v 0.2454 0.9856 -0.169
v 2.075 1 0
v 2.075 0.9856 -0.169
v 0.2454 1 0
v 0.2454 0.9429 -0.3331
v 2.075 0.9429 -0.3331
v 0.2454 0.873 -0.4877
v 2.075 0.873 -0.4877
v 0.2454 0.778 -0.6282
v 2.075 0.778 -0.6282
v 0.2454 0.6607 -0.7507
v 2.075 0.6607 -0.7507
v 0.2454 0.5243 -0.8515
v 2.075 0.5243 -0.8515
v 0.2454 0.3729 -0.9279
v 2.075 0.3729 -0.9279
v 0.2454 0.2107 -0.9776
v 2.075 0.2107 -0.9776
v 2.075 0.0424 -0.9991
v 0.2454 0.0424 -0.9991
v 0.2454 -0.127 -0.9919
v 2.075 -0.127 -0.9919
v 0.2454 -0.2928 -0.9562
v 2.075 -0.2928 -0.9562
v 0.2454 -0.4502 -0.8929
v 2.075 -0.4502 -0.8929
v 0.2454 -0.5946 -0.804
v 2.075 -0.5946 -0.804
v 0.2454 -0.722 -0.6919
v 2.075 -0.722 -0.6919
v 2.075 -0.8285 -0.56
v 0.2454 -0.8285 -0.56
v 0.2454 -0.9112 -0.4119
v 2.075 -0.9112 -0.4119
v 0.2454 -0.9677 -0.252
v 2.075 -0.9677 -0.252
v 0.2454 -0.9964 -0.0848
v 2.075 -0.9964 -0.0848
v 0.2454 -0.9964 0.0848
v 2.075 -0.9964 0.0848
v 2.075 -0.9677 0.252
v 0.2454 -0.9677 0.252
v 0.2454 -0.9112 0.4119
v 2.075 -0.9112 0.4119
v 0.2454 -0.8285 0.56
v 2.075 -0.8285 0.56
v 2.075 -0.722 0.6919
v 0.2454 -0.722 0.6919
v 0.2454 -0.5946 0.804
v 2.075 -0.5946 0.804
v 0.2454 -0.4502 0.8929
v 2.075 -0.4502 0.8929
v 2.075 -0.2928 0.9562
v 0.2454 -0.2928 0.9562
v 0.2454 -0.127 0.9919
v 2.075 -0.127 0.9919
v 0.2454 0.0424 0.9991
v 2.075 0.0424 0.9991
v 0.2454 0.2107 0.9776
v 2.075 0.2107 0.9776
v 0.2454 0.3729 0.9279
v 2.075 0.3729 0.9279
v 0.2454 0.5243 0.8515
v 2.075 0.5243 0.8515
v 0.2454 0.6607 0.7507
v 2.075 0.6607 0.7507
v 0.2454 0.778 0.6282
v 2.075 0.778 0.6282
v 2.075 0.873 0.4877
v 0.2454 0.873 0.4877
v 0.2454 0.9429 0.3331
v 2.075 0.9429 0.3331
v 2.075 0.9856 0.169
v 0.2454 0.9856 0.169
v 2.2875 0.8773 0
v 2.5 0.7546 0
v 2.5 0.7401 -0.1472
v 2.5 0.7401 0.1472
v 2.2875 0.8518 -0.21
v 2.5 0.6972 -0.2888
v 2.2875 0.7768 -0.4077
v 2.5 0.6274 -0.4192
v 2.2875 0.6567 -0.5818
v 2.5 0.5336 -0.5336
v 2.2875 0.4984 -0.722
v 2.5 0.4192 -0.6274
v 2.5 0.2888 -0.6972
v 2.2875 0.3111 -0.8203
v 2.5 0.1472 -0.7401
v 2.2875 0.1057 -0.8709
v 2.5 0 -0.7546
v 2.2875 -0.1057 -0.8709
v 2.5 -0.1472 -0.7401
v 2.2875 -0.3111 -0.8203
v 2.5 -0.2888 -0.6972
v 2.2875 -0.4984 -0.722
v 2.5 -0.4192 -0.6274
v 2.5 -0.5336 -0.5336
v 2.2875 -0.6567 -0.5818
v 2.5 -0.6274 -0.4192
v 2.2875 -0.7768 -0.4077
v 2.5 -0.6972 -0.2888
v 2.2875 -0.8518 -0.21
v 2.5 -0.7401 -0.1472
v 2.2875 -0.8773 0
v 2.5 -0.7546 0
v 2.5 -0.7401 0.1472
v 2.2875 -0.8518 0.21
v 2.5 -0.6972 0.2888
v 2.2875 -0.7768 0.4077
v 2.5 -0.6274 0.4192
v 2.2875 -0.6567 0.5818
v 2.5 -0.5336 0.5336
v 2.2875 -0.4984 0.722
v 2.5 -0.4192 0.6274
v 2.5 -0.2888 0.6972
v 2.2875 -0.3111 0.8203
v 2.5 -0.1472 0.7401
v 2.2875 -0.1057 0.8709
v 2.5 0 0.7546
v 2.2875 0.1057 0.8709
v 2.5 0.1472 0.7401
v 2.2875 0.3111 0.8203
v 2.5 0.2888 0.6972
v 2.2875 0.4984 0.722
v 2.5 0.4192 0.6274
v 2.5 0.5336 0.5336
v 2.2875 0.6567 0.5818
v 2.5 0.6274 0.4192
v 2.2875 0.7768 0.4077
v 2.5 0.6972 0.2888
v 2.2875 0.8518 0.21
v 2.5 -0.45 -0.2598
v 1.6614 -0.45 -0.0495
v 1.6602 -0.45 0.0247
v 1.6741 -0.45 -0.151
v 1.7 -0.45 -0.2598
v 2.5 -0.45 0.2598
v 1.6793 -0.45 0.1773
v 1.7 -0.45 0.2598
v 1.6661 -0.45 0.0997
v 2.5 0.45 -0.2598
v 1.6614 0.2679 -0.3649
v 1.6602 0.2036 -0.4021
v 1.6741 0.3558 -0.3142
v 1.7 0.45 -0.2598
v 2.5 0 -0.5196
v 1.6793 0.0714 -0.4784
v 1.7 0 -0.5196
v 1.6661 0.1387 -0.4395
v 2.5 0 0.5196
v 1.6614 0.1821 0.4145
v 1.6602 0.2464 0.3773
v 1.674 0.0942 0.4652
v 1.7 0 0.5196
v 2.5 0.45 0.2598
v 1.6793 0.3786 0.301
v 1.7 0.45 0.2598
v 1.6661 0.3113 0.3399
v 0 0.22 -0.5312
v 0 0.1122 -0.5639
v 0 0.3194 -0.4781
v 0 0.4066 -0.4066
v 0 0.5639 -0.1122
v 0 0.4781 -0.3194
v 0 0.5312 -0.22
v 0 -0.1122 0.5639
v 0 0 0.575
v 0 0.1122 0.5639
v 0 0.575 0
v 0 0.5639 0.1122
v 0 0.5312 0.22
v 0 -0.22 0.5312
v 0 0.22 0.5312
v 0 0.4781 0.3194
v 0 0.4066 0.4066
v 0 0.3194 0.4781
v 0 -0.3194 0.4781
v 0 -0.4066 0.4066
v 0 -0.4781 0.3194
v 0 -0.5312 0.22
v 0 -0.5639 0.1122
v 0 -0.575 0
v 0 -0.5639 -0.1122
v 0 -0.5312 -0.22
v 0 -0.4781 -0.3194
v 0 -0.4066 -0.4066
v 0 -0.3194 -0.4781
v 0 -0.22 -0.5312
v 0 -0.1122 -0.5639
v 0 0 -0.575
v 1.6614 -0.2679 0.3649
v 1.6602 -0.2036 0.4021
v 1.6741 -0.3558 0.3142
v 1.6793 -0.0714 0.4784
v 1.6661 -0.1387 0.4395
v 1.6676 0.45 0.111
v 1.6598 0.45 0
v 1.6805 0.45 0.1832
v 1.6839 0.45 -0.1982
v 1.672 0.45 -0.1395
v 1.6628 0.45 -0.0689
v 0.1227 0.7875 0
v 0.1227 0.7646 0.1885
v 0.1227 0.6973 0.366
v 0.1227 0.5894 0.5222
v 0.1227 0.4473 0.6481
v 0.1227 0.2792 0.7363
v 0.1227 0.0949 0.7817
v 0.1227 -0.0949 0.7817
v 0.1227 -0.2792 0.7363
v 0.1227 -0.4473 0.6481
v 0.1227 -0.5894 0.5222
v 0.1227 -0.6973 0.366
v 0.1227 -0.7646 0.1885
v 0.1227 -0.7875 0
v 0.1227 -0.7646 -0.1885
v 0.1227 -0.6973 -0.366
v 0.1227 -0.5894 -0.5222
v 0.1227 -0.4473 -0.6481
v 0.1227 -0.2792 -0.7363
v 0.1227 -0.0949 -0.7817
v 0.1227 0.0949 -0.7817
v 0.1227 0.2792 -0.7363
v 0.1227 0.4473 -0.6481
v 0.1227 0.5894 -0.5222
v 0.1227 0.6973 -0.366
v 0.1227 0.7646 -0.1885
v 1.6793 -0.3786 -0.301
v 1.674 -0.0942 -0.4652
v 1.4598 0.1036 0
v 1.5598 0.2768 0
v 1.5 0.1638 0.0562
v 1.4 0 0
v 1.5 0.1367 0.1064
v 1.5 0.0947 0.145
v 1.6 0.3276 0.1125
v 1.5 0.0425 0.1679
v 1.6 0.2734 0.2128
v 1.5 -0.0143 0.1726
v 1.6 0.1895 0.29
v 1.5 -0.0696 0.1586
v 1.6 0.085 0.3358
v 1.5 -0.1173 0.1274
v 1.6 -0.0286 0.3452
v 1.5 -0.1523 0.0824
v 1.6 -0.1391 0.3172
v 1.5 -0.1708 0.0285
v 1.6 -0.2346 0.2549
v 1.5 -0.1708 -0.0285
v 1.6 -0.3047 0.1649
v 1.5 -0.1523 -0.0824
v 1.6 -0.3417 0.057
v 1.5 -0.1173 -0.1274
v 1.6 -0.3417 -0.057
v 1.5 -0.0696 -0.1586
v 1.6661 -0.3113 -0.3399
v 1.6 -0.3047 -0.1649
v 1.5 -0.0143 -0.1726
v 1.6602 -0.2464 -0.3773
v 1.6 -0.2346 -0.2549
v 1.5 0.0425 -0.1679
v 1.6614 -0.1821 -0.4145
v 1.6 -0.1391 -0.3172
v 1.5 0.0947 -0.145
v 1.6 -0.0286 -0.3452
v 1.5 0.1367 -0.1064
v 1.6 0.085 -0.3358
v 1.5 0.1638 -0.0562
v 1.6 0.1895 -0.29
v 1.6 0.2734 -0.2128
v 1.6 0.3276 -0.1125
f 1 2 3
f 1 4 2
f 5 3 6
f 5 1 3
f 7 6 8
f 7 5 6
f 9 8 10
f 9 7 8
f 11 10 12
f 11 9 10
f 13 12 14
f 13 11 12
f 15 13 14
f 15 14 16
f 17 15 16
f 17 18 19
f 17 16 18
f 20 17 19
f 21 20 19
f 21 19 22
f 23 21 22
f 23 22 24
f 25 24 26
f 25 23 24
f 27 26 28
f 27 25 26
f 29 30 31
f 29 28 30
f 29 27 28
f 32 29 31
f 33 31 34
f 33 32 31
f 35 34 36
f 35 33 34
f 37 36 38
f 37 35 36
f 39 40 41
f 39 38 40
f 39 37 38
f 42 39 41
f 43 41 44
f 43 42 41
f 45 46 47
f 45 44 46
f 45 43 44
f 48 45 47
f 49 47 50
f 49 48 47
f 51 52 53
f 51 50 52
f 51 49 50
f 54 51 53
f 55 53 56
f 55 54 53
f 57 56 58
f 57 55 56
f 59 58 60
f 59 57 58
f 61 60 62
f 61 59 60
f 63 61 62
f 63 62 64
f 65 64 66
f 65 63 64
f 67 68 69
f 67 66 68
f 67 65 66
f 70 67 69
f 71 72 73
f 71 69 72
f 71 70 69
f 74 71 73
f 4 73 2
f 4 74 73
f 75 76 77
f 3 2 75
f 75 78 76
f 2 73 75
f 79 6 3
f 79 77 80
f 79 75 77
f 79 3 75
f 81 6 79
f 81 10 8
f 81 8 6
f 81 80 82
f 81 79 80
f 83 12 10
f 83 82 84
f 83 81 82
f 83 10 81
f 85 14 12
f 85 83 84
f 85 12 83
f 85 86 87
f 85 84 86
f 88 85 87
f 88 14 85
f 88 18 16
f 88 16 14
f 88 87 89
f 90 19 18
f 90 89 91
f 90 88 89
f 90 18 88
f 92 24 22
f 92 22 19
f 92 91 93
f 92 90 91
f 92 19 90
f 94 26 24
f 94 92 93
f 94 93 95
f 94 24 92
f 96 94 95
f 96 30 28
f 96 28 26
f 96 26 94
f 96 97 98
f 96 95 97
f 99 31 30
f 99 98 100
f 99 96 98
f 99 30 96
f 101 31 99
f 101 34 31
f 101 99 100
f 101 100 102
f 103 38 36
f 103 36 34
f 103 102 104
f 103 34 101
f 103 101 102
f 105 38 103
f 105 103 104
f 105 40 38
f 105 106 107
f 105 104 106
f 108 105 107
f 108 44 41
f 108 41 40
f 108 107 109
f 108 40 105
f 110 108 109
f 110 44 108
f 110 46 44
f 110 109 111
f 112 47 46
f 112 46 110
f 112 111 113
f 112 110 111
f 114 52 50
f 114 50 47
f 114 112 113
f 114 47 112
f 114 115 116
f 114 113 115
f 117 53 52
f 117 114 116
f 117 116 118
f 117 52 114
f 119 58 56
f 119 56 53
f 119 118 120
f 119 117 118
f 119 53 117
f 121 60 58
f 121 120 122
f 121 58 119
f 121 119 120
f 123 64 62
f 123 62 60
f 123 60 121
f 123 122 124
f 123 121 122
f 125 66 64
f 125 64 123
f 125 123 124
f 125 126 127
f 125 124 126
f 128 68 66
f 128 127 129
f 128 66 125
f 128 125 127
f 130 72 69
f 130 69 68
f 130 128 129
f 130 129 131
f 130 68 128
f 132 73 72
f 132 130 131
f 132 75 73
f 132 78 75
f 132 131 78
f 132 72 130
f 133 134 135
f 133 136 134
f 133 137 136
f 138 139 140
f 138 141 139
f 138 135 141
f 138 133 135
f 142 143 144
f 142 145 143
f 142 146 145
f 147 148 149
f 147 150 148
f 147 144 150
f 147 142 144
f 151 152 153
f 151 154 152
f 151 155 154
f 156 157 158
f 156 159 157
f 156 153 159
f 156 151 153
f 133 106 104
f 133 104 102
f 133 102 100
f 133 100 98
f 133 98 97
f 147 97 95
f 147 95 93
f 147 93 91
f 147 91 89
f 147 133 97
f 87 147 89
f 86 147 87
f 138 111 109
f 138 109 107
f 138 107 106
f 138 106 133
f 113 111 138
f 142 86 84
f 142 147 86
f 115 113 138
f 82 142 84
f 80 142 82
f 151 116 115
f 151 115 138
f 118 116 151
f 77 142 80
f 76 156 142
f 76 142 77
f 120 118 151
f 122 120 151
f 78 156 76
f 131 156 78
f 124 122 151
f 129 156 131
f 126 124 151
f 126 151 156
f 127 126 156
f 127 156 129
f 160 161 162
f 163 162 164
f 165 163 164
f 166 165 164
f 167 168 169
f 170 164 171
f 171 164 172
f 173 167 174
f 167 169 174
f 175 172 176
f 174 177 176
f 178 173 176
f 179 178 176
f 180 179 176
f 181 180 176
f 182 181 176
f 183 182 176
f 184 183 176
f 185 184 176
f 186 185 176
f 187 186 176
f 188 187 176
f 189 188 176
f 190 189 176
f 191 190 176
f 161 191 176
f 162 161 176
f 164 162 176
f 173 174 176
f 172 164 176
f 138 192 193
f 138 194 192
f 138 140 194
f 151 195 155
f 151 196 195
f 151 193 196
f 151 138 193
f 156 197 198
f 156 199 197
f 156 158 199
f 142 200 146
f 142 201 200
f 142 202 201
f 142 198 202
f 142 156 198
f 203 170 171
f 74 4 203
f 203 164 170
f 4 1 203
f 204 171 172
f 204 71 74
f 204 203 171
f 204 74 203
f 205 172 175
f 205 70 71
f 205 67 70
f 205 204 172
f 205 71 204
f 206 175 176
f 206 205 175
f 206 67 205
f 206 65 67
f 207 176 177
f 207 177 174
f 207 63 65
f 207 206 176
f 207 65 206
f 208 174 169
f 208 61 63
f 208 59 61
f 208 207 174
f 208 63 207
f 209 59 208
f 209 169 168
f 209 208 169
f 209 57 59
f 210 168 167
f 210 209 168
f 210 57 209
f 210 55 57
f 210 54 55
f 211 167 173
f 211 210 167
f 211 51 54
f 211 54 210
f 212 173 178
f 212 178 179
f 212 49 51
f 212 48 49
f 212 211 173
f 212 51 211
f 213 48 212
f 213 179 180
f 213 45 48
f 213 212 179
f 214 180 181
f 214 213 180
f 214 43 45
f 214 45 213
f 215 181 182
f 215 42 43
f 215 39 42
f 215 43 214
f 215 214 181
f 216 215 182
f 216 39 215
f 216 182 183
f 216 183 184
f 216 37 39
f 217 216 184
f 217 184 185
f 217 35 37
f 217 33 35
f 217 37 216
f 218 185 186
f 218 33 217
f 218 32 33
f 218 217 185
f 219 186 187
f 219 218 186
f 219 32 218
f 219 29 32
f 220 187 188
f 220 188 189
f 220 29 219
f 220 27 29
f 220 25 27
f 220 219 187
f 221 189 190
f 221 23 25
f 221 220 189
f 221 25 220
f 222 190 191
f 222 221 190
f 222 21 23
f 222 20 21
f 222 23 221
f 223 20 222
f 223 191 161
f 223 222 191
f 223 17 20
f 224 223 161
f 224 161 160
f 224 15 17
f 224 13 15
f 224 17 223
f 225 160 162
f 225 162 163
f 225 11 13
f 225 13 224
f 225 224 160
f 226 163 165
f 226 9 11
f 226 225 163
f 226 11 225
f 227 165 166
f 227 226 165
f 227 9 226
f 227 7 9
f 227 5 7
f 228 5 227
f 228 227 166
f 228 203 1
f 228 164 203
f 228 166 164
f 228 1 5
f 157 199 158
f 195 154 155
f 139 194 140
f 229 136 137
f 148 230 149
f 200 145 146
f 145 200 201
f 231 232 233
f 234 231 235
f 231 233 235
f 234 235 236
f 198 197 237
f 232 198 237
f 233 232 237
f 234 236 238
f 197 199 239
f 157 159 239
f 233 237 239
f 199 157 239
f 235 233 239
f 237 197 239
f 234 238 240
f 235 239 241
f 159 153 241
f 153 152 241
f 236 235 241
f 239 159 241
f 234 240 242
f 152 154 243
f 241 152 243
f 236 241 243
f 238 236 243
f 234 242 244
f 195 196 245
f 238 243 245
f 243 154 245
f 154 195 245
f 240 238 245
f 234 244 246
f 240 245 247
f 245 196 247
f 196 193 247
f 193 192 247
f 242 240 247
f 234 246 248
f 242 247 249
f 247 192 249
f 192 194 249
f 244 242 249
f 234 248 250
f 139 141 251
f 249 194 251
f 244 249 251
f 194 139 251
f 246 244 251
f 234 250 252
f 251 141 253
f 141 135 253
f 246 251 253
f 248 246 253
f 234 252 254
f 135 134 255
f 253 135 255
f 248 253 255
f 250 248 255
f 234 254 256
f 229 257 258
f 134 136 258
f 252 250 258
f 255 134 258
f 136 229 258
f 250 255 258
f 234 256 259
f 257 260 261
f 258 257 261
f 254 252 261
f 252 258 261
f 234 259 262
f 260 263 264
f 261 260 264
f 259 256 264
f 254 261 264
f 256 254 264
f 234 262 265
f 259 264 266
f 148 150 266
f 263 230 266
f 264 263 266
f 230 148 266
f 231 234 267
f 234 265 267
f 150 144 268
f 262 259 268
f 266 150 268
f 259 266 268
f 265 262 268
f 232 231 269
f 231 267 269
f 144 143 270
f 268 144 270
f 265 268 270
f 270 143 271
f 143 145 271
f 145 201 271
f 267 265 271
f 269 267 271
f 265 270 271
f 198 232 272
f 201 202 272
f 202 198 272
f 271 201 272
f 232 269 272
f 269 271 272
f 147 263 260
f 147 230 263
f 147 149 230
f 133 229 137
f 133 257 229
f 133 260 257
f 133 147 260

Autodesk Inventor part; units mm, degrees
ref_plane "YZ Plane" through (0, 0, 0) normal (1, 0, 0) x (0, 1, 0)
ref_plane "XZ Plane" through (0, 0, 0) normal (0, 1, 0) x (-1, 0, 0)
sketch "Skizze1" plane through (0, 0, 0) normal (0, 0, 1) x (1, 0, 0)
  line L0 (0, 0) -> (1.4, 0)
  line L1 (2.5, 0.5196) -> (2.5, 1)
  line L2 (2.5, 1) -> (0, 1)
  line L3 (2.5, 0.5196) -> (1.7, 0.5196)
  line L4 (1.7, 0.5196) -> (1.4, 0)
  line L5 (0, -0.2) -> (0, 1.2) projected
  line L6 (0, 1) -> (0, 0)
  dimension "d0" = 0.8
  dimension "d1" = 60
  dimension "d2" = 2
  dimension "d3" = 1.0392
  dimension "d5" = 2.5
revolve "Körper" add sketch "Skizze1" angle 360 about axis through (0, 0, 0) along (1, 0, 0)
chamfer "Fase1" distance 0.2454 angle 60 1 edges at (2.5, -1, 0) measured on face at (2.5, 0.8252, -0.1212)
sketch "Skizze2" plane through (2.5, 0, 0) normal (1, 0, 0) x (0, 0, -1)
  circle A0 centre (0, 0) radius 0.5196 projected
  line L0 (-0.2598, 0.45) -> (0.2598, 0.45)
  line L1 (0.2598, 0.45) -> (0.5196, 0)
  line L2 (0.5196, 0) -> (0.2598, -0.45)
  line L3 (0.2598, -0.45) -> (-0.2598, -0.45)
  line L4 (-0.2598, -0.45) -> (-0.5196, 0)
  line L5 (-0.5196, 0) -> (-0.2598, 0.45)
extrude "Loch" add sketch "Skizze2" against normal up to next contours L1 A0 | A0 L2 | L0 A0 | A0 L3 | L5 A0 | A0 L4
thread "Gewinde" size "M2x0.4" class "6g" standard "ISO Metric profile" length 2.5
chamfer "Fase2" distance 0.2454 angle 60 1 edges at (0, -1, 0) measured on face at (0.6917, 0.9871, -0.1604)
ref_plane "Work Plane1" through (1.25, 0, 0) normal (0, 0.5, 0.866) x (1, 0, 0)
equation "\"d0\" = INTI"
equation "\"d2\" = NND"
equation "\"d3\" = 1.1547 * SW"
equation "\"d5\" = NLG"
equation "\"d7\" = -0.5 * GD1 + 0.5 * NND"
equation "\"d8\" = FAWI"
equation "\"d29\" = -0.5 * GD1 + 0.5 * NND"
equation "\"d11\" = NLG"
equation "\"d13\" = -0.5 * GD1 + 0.5 * NND"
equation "\"d14\" = FAWI"
equation "\"d30\" = -0.5 * GD1 + 0.5 * NND"
equation "\"NND\" = 2"
equation "\"NLG\" = 2.5"
equation "\"INTI\" = 0.8"
equation "\"FAWI\" = 60deg"
equation "\"SW\" = 0.9"
equation "\"GD1\" = THREADDIA - 1.2269 * PTC"
equation "\"FAWI1\" = 45deg"
equation "\"GUL\" = 0.61345 * PTC"
equation "\"SPD\" = 1"
equation "\"TOA\" = 30deg"
equation "\"THREADDIA\" = 2"
equation "\"PTC\" = 0.4"
equation "\"GAL\" = 0.61345 * PTC"
equation "\"E0\" = 1.155 * SW"
properties part number "BS 4168 - M2 x 2,5" material "Steel, Mild"
